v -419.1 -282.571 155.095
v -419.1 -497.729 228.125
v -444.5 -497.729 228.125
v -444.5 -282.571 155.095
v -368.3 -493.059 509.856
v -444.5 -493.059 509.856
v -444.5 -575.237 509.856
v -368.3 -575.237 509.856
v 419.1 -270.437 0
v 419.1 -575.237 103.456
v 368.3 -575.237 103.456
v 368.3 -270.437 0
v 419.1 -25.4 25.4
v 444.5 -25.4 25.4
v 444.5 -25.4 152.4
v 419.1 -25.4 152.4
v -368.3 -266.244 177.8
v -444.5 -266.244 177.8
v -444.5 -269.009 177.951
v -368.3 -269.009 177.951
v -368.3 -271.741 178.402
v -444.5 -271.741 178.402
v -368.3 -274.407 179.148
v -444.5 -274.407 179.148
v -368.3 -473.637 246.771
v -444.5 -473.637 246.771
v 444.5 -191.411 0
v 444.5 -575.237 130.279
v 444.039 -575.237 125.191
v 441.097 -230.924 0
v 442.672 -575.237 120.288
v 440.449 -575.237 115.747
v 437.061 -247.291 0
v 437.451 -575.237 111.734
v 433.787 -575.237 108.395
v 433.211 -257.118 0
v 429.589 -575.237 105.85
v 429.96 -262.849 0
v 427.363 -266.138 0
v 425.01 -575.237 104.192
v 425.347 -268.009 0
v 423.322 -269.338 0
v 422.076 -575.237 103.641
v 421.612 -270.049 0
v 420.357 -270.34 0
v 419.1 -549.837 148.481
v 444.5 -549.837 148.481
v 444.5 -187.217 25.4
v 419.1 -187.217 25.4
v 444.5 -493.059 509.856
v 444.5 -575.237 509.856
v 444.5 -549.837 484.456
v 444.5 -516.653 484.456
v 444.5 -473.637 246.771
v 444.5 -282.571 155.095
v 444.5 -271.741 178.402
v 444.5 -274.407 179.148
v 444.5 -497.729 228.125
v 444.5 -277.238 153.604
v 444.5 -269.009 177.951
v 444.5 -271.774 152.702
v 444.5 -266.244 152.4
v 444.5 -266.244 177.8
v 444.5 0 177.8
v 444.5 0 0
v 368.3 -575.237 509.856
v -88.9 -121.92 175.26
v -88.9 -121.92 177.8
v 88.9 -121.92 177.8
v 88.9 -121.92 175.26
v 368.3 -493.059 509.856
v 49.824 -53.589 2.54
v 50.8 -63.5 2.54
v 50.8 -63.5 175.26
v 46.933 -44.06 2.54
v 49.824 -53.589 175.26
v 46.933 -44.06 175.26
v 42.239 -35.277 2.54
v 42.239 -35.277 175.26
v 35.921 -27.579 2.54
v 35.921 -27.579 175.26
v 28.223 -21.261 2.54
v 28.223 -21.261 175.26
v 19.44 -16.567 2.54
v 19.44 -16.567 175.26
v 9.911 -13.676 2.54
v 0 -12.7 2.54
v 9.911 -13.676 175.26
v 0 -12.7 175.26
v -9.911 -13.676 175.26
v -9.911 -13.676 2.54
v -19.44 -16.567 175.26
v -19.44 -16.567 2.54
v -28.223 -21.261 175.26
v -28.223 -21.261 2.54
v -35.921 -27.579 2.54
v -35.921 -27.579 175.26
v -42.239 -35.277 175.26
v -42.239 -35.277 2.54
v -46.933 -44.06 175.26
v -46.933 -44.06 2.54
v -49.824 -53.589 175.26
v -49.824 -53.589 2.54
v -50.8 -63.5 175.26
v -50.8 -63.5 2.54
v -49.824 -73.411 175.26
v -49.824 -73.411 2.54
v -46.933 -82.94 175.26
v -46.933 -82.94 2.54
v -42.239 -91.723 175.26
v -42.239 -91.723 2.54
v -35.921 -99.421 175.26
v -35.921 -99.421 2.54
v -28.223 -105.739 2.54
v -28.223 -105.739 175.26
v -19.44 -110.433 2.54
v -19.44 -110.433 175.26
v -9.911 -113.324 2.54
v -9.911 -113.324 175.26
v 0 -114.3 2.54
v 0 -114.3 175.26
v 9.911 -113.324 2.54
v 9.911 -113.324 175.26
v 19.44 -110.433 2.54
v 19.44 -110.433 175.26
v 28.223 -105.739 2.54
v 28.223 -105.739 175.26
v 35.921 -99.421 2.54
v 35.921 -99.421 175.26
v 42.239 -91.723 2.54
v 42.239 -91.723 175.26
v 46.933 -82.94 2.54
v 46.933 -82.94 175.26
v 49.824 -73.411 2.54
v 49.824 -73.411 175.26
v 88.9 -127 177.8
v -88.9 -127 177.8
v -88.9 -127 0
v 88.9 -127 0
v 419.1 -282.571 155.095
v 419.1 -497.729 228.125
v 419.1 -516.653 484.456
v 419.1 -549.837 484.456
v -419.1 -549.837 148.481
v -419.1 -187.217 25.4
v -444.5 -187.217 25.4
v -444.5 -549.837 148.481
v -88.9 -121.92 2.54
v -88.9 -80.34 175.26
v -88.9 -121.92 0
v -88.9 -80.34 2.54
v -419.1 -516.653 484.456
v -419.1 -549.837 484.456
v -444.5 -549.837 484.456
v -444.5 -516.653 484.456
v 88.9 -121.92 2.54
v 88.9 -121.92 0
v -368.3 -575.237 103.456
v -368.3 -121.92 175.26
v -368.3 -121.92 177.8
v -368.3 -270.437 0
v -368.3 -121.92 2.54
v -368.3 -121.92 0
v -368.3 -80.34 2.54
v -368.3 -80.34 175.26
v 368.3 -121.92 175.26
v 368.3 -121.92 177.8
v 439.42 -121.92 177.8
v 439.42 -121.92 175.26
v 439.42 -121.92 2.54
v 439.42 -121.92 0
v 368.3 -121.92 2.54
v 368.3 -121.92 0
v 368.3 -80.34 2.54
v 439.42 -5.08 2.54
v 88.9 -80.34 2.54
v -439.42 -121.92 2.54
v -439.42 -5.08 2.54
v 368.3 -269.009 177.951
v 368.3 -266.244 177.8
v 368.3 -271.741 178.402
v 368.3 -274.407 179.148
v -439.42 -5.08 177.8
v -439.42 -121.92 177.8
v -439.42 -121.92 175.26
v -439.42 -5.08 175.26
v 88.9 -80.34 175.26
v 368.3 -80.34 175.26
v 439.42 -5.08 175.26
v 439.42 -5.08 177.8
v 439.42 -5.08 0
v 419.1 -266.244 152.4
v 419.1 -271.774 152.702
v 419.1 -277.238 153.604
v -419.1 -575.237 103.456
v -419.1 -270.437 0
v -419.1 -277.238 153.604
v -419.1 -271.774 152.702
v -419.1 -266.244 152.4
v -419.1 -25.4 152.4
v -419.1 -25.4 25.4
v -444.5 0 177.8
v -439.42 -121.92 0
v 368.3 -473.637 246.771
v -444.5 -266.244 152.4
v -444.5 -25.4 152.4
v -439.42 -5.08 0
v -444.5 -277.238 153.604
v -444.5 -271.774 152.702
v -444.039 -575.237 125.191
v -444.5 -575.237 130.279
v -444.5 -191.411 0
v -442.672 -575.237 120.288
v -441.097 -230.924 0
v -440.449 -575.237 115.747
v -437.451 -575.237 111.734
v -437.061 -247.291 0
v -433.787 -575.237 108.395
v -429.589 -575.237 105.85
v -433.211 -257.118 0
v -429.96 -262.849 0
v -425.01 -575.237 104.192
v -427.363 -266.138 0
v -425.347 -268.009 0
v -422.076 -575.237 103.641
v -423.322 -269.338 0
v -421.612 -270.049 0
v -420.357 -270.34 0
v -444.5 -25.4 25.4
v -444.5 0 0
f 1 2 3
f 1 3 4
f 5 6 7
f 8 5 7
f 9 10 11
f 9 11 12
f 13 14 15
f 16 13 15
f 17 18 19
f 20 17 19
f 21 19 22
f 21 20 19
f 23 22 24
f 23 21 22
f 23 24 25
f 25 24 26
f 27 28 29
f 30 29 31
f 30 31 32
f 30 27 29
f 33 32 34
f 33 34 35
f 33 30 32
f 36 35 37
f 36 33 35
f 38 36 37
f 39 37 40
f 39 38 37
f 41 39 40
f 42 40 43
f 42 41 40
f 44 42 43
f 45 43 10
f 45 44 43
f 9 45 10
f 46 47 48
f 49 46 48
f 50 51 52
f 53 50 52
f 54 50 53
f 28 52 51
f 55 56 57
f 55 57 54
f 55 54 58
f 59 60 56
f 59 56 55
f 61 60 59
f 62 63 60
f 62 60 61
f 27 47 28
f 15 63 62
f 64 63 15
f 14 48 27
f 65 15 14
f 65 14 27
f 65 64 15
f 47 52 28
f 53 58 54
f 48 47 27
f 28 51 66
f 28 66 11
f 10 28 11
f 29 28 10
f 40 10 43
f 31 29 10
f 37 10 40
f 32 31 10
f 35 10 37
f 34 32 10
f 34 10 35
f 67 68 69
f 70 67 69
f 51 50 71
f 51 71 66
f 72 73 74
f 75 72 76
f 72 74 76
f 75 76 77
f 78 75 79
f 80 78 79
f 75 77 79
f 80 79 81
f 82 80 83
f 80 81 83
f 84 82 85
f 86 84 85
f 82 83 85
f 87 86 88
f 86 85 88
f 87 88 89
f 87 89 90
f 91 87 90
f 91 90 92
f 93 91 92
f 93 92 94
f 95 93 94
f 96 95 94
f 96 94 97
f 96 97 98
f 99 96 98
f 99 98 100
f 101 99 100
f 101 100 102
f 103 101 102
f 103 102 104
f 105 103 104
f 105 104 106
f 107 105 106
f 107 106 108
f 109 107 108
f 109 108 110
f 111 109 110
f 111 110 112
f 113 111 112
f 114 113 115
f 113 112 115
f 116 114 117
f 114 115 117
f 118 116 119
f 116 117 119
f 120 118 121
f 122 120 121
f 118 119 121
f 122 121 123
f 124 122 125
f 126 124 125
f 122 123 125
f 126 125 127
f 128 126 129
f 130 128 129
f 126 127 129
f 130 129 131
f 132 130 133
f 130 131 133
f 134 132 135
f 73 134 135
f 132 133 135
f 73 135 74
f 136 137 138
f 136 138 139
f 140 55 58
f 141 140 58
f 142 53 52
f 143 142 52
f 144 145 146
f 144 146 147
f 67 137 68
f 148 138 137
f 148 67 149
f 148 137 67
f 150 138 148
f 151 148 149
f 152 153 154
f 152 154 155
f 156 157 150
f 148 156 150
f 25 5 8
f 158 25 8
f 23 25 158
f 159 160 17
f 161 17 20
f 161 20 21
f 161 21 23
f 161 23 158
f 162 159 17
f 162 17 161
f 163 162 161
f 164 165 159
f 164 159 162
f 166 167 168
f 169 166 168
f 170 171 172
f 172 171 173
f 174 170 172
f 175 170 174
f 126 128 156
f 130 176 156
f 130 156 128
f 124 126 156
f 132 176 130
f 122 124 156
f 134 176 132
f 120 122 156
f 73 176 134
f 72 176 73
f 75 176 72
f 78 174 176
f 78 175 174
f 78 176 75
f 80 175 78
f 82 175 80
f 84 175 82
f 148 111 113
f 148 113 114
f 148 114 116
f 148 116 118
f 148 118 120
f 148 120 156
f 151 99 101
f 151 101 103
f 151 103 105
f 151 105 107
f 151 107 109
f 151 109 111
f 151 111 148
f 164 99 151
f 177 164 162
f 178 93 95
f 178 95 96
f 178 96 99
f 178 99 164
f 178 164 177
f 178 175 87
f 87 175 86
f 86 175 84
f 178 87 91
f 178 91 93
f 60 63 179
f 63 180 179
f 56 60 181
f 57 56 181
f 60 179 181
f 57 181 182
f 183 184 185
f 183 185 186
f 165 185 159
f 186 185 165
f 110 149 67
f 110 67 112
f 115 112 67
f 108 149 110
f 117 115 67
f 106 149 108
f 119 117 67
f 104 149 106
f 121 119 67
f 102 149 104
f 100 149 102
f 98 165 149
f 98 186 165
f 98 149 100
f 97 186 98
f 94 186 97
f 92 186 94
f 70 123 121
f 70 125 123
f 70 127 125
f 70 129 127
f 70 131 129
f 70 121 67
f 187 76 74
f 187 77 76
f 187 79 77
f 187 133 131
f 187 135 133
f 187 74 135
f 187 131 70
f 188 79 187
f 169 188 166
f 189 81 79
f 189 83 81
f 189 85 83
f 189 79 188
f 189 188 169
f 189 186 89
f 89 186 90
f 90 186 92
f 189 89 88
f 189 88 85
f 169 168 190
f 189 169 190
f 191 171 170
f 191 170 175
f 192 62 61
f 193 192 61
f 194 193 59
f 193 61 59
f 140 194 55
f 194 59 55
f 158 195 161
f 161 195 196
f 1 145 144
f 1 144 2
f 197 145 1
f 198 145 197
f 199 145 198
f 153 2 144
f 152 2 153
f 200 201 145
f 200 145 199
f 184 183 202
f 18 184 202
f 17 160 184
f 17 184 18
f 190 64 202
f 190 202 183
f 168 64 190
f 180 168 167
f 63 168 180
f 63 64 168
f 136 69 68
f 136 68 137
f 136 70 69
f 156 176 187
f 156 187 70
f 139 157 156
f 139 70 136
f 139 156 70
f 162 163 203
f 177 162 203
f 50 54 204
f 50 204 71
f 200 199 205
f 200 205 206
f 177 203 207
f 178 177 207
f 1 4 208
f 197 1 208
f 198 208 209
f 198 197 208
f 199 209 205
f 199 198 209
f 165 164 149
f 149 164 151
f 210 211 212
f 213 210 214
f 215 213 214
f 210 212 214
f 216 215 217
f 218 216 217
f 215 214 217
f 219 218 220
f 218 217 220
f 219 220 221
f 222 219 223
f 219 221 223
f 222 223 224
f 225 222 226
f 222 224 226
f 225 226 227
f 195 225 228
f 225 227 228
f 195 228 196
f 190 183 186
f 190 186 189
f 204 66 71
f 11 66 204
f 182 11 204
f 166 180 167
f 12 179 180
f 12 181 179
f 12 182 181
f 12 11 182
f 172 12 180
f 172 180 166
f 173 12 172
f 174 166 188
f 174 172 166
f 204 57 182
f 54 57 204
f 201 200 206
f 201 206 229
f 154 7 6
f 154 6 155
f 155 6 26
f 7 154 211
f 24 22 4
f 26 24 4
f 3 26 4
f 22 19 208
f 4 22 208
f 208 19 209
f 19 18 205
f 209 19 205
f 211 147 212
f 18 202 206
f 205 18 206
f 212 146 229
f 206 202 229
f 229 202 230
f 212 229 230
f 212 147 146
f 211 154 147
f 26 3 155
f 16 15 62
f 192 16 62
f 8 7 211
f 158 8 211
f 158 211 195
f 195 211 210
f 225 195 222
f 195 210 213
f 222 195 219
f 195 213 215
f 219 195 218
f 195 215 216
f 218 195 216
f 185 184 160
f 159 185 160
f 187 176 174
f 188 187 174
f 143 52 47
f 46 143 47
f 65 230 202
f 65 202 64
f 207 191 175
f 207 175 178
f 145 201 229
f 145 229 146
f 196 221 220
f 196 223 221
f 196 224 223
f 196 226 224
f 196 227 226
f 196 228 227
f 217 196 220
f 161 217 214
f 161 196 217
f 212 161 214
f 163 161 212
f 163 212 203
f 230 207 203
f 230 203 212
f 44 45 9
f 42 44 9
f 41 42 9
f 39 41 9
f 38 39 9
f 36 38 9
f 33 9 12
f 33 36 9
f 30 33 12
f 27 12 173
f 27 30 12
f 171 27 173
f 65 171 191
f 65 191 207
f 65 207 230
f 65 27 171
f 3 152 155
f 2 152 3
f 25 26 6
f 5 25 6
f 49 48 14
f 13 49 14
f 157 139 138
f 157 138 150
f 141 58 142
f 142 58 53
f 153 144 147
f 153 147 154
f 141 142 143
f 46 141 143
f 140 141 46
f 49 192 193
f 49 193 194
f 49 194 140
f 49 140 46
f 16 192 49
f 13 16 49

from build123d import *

# Parameters (mm, degrees)
SKETCH1_W               = 889
SKETCH1_H               = 127
BOSS_EXTRUDE1_DEPTH     = 177.8
SKETCH2_R               = 50.8
CUT_EXTRUDE1_DEPTH      = 496.3
SKETCH3_W               = 878.84
SKETCH3_H               = 116.84
SKETCH3_R               = 50.8
CUT_EXTRUDE2_DEPTH      = 2.54
SKETCH4_W               = 878.84
SKETCH4_H               = 116.84
CUT_EXTRUDE3_DEPTH      = 2.54
SKETCH5_W               = 177.8
SKETCH5_H               = 143.436769994
BOSS_EXTRUDE2_DEPTH     = 76.2
BOSS_EXTRUDE3_DEPTH     = 76.2
FILLET1_R               = 25.4
FILLET2_R               = 25.4
FILLET5_R               = 25.4
FILLET6_R               = 25.4
CUT_EXTRUDE5_DEPTH      = 25.4
CUT_EXTRUDE6_START      = -25.4
CUT_EXTRUDE6_DEPTH      = 25.4
CUT_EXTRUDE7_DEPTH      = 25.4
CUT_EXTRUDE7_DEPTH_BACK = 801.270015469
SKETCH12_W              = 279.4
SKETCH12_H              = 41.580374328
SKETCH12_H_2            = 85.419625672


with BuildPart() as part:
    # Sketch1 → Boss-Extrude1 (new body)
    with BuildSketch(Plane.XY):
        with Locations((0, -63.5)):
            Rectangle(SKETCH1_W, SKETCH1_H)
    extrude(amount=BOSS_EXTRUDE1_DEPTH)

    # Sketch2 → Cut-Extrude1 (cut, through all)
    with BuildSketch(Plane.XY.offset(177.8)):
        with Locations((0, -63.5)):
            Circle(SKETCH2_R)
    extrude(amount=-CUT_EXTRUDE1_DEPTH, mode=Mode.SUBTRACT)

    # Sketch3 → Cut-Extrude2 (cut)
    with BuildSketch(Plane.XY.offset(177.8)):
        with Locations((0, -63.5)):
            Rectangle(SKETCH3_W, SKETCH3_H)
        with Locations((0, -63.5)):
            Circle(SKETCH3_R, mode=Mode.SUBTRACT)
    extrude(amount=-CUT_EXTRUDE2_DEPTH, mode=Mode.SUBTRACT)

    # Sketch4 → Cut-Extrude3 (cut)
    with BuildSketch(Plane(origin=(0, 0, 0), x_dir=(-1, 0, 0), z_dir=(0, 0, -1))):
        with Locations((0, -63.5)):
            Rectangle(SKETCH4_W, SKETCH4_H)
    extrude(amount=-CUT_EXTRUDE3_DEPTH, mode=Mode.SUBTRACT)

    # Sketch5 → Boss-Extrude2 (add)
    with BuildSketch(Plane.ZY.offset(444.5)):
        Polygon((509.856034206, -575.236769994), (103.456034206, -575.236769994), (0, -270.436769994), (177.8, -270.436769994), (246.770689471, -473.636769994), (509.856034206, -493.059090132), align=None)
        with Locations((88.9, -198.718384997)):
            Rectangle(SKETCH5_W, SKETCH5_H)
    extrude(amount=-BOSS_EXTRUDE2_DEPTH)

    # Sketch8 → Boss-Extrude3 (add)
    with BuildSketch(Plane(origin=(444.5, 0, 0), x_dir=(0, 0, -1), z_dir=(1, 0, 0))):
        Polygon((-509.856034206, -575.236769994), (-103.456034206, -575.236769994), (0, -270.436769994), (0, -127), (-177.8, -127), (-177.8, -270.436769994), (-246.770689471, -473.636769994), (-509.856034206, -493.059090132), align=None)
    extrude(amount=-BOSS_EXTRUDE3_DEPTH)

    # Fillet1
    fillet1_edges = [part.edges().sort_by_distance(p)[0] for p in [
        (-406.4, -270.436769994, 177.8),
    ]]
    fillet(fillet1_edges, radius=FILLET1_R)

    # Fillet2
    fillet2_edges = [part.edges().sort_by_distance(p)[0] for p in [
        (406.4, -270.436769994, 177.8),
    ]]
    fillet(fillet2_edges, radius=FILLET2_R)

    # Fillet5
    fillet5_edges = [part.edges().sort_by_distance(p)[0] for p in [
        (444.5, -422.836769994, 51.728017103),
    ]]
    fillet(fillet5_edges, radius=FILLET5_R)

    # Fillet6
    fillet6_edges = [part.edges().sort_by_distance(p)[0] for p in [
        (-444.5, -422.836769994, 51.728017103),
    ]]
    fillet(fillet6_edges, radius=FILLET6_R)

    # Sketch10 → Cut-Extrude5 (cut)
    with BuildSketch(Plane(origin=(444.5, 0, 0), x_dir=(0, 0, -1), z_dir=(1, 0, 0))):
        with BuildLine():
            Line((-484.456034206, -549.836769994), (-148.481224008, -549.836769994))
            Line((-148.481224008, -549.836769994), (-25.4, -187.217447055))
            Line((-25.4, -187.217447055), (-25.4, -25.4))
            Line((-25.4, -25.4), (-152.4, -25.4))
            Line((-152.4, -25.4), (-152.4, -266.243582389))
            ThreePointArc((-152.4, -266.243582389), (-153.078401591, -274.517962908), (-155.095487125, -282.571345281))
            Line((-155.095487125, -282.571345281), (-228.125002086, -497.729371886))
            Line((-228.125002086, -497.729371886), (-484.456034206, -516.653053752))
            Line((-484.456034206, -516.653053752), (-484.456034206, -549.836769994))
        make_face()
    extrude(amount=-CUT_EXTRUDE5_DEPTH, mode=Mode.SUBTRACT)

    # Sketch11 → Cut-Extrude6 (cut)
    with BuildSketch(Plane.ZY.offset(444.5).offset(CUT_EXTRUDE6_START)):
        with BuildLine():
            Line((25.4, -25.4), (25.4, -187.217447055))
            Line((25.4, -187.217447055), (148.481224008, -549.836769994))
            Line((148.481224008, -549.836769994), (484.456034206, -549.836769994))
            Line((484.456034206, -549.836769994), (484.456034206, -516.653053752))
            Line((484.456034206, -516.653053752), (228.125002086, -497.729371886))
            Line((228.125002086, -497.729371886), (155.095487125, -282.571345281))
            ThreePointArc((155.095487125, -282.571345281), (153.078401591, -274.517962908), (152.4, -266.243582389))
            Line((152.4, -266.243582389), (152.4, -25.4))
            Line((152.4, -25.4), (25.4, -25.4))
        make_face()
    extrude(amount=CUT_EXTRUDE6_DEPTH, mode=Mode.SUBTRACT)

    # Sketch12 → Cut-Extrude7 (cut, two sides: drawn at the far end of the back side and taken through both)
    with BuildSketch(Plane.XY.offset(175.26).offset(-CUT_EXTRUDE7_DEPTH_BACK)):
        with Locations((-228.6, -101.129812836)):
            Rectangle(SKETCH12_W, SKETCH12_H)
        with Locations((-228.6, -164.629812836)):
            Rectangle(SKETCH12_W, SKETCH12_H_2)
        with Locations((228.6, -101.129812836)):
            Rectangle(SKETCH12_W, SKETCH12_H)
        with Locations((228.6, -164.629812836)):
            Rectangle(SKETCH12_W, SKETCH12_H_2)
    extrude(amount=CUT_EXTRUDE7_DEPTH + CUT_EXTRUDE7_DEPTH_BACK, mode=Mode.SUBTRACT)


solid = part.part
